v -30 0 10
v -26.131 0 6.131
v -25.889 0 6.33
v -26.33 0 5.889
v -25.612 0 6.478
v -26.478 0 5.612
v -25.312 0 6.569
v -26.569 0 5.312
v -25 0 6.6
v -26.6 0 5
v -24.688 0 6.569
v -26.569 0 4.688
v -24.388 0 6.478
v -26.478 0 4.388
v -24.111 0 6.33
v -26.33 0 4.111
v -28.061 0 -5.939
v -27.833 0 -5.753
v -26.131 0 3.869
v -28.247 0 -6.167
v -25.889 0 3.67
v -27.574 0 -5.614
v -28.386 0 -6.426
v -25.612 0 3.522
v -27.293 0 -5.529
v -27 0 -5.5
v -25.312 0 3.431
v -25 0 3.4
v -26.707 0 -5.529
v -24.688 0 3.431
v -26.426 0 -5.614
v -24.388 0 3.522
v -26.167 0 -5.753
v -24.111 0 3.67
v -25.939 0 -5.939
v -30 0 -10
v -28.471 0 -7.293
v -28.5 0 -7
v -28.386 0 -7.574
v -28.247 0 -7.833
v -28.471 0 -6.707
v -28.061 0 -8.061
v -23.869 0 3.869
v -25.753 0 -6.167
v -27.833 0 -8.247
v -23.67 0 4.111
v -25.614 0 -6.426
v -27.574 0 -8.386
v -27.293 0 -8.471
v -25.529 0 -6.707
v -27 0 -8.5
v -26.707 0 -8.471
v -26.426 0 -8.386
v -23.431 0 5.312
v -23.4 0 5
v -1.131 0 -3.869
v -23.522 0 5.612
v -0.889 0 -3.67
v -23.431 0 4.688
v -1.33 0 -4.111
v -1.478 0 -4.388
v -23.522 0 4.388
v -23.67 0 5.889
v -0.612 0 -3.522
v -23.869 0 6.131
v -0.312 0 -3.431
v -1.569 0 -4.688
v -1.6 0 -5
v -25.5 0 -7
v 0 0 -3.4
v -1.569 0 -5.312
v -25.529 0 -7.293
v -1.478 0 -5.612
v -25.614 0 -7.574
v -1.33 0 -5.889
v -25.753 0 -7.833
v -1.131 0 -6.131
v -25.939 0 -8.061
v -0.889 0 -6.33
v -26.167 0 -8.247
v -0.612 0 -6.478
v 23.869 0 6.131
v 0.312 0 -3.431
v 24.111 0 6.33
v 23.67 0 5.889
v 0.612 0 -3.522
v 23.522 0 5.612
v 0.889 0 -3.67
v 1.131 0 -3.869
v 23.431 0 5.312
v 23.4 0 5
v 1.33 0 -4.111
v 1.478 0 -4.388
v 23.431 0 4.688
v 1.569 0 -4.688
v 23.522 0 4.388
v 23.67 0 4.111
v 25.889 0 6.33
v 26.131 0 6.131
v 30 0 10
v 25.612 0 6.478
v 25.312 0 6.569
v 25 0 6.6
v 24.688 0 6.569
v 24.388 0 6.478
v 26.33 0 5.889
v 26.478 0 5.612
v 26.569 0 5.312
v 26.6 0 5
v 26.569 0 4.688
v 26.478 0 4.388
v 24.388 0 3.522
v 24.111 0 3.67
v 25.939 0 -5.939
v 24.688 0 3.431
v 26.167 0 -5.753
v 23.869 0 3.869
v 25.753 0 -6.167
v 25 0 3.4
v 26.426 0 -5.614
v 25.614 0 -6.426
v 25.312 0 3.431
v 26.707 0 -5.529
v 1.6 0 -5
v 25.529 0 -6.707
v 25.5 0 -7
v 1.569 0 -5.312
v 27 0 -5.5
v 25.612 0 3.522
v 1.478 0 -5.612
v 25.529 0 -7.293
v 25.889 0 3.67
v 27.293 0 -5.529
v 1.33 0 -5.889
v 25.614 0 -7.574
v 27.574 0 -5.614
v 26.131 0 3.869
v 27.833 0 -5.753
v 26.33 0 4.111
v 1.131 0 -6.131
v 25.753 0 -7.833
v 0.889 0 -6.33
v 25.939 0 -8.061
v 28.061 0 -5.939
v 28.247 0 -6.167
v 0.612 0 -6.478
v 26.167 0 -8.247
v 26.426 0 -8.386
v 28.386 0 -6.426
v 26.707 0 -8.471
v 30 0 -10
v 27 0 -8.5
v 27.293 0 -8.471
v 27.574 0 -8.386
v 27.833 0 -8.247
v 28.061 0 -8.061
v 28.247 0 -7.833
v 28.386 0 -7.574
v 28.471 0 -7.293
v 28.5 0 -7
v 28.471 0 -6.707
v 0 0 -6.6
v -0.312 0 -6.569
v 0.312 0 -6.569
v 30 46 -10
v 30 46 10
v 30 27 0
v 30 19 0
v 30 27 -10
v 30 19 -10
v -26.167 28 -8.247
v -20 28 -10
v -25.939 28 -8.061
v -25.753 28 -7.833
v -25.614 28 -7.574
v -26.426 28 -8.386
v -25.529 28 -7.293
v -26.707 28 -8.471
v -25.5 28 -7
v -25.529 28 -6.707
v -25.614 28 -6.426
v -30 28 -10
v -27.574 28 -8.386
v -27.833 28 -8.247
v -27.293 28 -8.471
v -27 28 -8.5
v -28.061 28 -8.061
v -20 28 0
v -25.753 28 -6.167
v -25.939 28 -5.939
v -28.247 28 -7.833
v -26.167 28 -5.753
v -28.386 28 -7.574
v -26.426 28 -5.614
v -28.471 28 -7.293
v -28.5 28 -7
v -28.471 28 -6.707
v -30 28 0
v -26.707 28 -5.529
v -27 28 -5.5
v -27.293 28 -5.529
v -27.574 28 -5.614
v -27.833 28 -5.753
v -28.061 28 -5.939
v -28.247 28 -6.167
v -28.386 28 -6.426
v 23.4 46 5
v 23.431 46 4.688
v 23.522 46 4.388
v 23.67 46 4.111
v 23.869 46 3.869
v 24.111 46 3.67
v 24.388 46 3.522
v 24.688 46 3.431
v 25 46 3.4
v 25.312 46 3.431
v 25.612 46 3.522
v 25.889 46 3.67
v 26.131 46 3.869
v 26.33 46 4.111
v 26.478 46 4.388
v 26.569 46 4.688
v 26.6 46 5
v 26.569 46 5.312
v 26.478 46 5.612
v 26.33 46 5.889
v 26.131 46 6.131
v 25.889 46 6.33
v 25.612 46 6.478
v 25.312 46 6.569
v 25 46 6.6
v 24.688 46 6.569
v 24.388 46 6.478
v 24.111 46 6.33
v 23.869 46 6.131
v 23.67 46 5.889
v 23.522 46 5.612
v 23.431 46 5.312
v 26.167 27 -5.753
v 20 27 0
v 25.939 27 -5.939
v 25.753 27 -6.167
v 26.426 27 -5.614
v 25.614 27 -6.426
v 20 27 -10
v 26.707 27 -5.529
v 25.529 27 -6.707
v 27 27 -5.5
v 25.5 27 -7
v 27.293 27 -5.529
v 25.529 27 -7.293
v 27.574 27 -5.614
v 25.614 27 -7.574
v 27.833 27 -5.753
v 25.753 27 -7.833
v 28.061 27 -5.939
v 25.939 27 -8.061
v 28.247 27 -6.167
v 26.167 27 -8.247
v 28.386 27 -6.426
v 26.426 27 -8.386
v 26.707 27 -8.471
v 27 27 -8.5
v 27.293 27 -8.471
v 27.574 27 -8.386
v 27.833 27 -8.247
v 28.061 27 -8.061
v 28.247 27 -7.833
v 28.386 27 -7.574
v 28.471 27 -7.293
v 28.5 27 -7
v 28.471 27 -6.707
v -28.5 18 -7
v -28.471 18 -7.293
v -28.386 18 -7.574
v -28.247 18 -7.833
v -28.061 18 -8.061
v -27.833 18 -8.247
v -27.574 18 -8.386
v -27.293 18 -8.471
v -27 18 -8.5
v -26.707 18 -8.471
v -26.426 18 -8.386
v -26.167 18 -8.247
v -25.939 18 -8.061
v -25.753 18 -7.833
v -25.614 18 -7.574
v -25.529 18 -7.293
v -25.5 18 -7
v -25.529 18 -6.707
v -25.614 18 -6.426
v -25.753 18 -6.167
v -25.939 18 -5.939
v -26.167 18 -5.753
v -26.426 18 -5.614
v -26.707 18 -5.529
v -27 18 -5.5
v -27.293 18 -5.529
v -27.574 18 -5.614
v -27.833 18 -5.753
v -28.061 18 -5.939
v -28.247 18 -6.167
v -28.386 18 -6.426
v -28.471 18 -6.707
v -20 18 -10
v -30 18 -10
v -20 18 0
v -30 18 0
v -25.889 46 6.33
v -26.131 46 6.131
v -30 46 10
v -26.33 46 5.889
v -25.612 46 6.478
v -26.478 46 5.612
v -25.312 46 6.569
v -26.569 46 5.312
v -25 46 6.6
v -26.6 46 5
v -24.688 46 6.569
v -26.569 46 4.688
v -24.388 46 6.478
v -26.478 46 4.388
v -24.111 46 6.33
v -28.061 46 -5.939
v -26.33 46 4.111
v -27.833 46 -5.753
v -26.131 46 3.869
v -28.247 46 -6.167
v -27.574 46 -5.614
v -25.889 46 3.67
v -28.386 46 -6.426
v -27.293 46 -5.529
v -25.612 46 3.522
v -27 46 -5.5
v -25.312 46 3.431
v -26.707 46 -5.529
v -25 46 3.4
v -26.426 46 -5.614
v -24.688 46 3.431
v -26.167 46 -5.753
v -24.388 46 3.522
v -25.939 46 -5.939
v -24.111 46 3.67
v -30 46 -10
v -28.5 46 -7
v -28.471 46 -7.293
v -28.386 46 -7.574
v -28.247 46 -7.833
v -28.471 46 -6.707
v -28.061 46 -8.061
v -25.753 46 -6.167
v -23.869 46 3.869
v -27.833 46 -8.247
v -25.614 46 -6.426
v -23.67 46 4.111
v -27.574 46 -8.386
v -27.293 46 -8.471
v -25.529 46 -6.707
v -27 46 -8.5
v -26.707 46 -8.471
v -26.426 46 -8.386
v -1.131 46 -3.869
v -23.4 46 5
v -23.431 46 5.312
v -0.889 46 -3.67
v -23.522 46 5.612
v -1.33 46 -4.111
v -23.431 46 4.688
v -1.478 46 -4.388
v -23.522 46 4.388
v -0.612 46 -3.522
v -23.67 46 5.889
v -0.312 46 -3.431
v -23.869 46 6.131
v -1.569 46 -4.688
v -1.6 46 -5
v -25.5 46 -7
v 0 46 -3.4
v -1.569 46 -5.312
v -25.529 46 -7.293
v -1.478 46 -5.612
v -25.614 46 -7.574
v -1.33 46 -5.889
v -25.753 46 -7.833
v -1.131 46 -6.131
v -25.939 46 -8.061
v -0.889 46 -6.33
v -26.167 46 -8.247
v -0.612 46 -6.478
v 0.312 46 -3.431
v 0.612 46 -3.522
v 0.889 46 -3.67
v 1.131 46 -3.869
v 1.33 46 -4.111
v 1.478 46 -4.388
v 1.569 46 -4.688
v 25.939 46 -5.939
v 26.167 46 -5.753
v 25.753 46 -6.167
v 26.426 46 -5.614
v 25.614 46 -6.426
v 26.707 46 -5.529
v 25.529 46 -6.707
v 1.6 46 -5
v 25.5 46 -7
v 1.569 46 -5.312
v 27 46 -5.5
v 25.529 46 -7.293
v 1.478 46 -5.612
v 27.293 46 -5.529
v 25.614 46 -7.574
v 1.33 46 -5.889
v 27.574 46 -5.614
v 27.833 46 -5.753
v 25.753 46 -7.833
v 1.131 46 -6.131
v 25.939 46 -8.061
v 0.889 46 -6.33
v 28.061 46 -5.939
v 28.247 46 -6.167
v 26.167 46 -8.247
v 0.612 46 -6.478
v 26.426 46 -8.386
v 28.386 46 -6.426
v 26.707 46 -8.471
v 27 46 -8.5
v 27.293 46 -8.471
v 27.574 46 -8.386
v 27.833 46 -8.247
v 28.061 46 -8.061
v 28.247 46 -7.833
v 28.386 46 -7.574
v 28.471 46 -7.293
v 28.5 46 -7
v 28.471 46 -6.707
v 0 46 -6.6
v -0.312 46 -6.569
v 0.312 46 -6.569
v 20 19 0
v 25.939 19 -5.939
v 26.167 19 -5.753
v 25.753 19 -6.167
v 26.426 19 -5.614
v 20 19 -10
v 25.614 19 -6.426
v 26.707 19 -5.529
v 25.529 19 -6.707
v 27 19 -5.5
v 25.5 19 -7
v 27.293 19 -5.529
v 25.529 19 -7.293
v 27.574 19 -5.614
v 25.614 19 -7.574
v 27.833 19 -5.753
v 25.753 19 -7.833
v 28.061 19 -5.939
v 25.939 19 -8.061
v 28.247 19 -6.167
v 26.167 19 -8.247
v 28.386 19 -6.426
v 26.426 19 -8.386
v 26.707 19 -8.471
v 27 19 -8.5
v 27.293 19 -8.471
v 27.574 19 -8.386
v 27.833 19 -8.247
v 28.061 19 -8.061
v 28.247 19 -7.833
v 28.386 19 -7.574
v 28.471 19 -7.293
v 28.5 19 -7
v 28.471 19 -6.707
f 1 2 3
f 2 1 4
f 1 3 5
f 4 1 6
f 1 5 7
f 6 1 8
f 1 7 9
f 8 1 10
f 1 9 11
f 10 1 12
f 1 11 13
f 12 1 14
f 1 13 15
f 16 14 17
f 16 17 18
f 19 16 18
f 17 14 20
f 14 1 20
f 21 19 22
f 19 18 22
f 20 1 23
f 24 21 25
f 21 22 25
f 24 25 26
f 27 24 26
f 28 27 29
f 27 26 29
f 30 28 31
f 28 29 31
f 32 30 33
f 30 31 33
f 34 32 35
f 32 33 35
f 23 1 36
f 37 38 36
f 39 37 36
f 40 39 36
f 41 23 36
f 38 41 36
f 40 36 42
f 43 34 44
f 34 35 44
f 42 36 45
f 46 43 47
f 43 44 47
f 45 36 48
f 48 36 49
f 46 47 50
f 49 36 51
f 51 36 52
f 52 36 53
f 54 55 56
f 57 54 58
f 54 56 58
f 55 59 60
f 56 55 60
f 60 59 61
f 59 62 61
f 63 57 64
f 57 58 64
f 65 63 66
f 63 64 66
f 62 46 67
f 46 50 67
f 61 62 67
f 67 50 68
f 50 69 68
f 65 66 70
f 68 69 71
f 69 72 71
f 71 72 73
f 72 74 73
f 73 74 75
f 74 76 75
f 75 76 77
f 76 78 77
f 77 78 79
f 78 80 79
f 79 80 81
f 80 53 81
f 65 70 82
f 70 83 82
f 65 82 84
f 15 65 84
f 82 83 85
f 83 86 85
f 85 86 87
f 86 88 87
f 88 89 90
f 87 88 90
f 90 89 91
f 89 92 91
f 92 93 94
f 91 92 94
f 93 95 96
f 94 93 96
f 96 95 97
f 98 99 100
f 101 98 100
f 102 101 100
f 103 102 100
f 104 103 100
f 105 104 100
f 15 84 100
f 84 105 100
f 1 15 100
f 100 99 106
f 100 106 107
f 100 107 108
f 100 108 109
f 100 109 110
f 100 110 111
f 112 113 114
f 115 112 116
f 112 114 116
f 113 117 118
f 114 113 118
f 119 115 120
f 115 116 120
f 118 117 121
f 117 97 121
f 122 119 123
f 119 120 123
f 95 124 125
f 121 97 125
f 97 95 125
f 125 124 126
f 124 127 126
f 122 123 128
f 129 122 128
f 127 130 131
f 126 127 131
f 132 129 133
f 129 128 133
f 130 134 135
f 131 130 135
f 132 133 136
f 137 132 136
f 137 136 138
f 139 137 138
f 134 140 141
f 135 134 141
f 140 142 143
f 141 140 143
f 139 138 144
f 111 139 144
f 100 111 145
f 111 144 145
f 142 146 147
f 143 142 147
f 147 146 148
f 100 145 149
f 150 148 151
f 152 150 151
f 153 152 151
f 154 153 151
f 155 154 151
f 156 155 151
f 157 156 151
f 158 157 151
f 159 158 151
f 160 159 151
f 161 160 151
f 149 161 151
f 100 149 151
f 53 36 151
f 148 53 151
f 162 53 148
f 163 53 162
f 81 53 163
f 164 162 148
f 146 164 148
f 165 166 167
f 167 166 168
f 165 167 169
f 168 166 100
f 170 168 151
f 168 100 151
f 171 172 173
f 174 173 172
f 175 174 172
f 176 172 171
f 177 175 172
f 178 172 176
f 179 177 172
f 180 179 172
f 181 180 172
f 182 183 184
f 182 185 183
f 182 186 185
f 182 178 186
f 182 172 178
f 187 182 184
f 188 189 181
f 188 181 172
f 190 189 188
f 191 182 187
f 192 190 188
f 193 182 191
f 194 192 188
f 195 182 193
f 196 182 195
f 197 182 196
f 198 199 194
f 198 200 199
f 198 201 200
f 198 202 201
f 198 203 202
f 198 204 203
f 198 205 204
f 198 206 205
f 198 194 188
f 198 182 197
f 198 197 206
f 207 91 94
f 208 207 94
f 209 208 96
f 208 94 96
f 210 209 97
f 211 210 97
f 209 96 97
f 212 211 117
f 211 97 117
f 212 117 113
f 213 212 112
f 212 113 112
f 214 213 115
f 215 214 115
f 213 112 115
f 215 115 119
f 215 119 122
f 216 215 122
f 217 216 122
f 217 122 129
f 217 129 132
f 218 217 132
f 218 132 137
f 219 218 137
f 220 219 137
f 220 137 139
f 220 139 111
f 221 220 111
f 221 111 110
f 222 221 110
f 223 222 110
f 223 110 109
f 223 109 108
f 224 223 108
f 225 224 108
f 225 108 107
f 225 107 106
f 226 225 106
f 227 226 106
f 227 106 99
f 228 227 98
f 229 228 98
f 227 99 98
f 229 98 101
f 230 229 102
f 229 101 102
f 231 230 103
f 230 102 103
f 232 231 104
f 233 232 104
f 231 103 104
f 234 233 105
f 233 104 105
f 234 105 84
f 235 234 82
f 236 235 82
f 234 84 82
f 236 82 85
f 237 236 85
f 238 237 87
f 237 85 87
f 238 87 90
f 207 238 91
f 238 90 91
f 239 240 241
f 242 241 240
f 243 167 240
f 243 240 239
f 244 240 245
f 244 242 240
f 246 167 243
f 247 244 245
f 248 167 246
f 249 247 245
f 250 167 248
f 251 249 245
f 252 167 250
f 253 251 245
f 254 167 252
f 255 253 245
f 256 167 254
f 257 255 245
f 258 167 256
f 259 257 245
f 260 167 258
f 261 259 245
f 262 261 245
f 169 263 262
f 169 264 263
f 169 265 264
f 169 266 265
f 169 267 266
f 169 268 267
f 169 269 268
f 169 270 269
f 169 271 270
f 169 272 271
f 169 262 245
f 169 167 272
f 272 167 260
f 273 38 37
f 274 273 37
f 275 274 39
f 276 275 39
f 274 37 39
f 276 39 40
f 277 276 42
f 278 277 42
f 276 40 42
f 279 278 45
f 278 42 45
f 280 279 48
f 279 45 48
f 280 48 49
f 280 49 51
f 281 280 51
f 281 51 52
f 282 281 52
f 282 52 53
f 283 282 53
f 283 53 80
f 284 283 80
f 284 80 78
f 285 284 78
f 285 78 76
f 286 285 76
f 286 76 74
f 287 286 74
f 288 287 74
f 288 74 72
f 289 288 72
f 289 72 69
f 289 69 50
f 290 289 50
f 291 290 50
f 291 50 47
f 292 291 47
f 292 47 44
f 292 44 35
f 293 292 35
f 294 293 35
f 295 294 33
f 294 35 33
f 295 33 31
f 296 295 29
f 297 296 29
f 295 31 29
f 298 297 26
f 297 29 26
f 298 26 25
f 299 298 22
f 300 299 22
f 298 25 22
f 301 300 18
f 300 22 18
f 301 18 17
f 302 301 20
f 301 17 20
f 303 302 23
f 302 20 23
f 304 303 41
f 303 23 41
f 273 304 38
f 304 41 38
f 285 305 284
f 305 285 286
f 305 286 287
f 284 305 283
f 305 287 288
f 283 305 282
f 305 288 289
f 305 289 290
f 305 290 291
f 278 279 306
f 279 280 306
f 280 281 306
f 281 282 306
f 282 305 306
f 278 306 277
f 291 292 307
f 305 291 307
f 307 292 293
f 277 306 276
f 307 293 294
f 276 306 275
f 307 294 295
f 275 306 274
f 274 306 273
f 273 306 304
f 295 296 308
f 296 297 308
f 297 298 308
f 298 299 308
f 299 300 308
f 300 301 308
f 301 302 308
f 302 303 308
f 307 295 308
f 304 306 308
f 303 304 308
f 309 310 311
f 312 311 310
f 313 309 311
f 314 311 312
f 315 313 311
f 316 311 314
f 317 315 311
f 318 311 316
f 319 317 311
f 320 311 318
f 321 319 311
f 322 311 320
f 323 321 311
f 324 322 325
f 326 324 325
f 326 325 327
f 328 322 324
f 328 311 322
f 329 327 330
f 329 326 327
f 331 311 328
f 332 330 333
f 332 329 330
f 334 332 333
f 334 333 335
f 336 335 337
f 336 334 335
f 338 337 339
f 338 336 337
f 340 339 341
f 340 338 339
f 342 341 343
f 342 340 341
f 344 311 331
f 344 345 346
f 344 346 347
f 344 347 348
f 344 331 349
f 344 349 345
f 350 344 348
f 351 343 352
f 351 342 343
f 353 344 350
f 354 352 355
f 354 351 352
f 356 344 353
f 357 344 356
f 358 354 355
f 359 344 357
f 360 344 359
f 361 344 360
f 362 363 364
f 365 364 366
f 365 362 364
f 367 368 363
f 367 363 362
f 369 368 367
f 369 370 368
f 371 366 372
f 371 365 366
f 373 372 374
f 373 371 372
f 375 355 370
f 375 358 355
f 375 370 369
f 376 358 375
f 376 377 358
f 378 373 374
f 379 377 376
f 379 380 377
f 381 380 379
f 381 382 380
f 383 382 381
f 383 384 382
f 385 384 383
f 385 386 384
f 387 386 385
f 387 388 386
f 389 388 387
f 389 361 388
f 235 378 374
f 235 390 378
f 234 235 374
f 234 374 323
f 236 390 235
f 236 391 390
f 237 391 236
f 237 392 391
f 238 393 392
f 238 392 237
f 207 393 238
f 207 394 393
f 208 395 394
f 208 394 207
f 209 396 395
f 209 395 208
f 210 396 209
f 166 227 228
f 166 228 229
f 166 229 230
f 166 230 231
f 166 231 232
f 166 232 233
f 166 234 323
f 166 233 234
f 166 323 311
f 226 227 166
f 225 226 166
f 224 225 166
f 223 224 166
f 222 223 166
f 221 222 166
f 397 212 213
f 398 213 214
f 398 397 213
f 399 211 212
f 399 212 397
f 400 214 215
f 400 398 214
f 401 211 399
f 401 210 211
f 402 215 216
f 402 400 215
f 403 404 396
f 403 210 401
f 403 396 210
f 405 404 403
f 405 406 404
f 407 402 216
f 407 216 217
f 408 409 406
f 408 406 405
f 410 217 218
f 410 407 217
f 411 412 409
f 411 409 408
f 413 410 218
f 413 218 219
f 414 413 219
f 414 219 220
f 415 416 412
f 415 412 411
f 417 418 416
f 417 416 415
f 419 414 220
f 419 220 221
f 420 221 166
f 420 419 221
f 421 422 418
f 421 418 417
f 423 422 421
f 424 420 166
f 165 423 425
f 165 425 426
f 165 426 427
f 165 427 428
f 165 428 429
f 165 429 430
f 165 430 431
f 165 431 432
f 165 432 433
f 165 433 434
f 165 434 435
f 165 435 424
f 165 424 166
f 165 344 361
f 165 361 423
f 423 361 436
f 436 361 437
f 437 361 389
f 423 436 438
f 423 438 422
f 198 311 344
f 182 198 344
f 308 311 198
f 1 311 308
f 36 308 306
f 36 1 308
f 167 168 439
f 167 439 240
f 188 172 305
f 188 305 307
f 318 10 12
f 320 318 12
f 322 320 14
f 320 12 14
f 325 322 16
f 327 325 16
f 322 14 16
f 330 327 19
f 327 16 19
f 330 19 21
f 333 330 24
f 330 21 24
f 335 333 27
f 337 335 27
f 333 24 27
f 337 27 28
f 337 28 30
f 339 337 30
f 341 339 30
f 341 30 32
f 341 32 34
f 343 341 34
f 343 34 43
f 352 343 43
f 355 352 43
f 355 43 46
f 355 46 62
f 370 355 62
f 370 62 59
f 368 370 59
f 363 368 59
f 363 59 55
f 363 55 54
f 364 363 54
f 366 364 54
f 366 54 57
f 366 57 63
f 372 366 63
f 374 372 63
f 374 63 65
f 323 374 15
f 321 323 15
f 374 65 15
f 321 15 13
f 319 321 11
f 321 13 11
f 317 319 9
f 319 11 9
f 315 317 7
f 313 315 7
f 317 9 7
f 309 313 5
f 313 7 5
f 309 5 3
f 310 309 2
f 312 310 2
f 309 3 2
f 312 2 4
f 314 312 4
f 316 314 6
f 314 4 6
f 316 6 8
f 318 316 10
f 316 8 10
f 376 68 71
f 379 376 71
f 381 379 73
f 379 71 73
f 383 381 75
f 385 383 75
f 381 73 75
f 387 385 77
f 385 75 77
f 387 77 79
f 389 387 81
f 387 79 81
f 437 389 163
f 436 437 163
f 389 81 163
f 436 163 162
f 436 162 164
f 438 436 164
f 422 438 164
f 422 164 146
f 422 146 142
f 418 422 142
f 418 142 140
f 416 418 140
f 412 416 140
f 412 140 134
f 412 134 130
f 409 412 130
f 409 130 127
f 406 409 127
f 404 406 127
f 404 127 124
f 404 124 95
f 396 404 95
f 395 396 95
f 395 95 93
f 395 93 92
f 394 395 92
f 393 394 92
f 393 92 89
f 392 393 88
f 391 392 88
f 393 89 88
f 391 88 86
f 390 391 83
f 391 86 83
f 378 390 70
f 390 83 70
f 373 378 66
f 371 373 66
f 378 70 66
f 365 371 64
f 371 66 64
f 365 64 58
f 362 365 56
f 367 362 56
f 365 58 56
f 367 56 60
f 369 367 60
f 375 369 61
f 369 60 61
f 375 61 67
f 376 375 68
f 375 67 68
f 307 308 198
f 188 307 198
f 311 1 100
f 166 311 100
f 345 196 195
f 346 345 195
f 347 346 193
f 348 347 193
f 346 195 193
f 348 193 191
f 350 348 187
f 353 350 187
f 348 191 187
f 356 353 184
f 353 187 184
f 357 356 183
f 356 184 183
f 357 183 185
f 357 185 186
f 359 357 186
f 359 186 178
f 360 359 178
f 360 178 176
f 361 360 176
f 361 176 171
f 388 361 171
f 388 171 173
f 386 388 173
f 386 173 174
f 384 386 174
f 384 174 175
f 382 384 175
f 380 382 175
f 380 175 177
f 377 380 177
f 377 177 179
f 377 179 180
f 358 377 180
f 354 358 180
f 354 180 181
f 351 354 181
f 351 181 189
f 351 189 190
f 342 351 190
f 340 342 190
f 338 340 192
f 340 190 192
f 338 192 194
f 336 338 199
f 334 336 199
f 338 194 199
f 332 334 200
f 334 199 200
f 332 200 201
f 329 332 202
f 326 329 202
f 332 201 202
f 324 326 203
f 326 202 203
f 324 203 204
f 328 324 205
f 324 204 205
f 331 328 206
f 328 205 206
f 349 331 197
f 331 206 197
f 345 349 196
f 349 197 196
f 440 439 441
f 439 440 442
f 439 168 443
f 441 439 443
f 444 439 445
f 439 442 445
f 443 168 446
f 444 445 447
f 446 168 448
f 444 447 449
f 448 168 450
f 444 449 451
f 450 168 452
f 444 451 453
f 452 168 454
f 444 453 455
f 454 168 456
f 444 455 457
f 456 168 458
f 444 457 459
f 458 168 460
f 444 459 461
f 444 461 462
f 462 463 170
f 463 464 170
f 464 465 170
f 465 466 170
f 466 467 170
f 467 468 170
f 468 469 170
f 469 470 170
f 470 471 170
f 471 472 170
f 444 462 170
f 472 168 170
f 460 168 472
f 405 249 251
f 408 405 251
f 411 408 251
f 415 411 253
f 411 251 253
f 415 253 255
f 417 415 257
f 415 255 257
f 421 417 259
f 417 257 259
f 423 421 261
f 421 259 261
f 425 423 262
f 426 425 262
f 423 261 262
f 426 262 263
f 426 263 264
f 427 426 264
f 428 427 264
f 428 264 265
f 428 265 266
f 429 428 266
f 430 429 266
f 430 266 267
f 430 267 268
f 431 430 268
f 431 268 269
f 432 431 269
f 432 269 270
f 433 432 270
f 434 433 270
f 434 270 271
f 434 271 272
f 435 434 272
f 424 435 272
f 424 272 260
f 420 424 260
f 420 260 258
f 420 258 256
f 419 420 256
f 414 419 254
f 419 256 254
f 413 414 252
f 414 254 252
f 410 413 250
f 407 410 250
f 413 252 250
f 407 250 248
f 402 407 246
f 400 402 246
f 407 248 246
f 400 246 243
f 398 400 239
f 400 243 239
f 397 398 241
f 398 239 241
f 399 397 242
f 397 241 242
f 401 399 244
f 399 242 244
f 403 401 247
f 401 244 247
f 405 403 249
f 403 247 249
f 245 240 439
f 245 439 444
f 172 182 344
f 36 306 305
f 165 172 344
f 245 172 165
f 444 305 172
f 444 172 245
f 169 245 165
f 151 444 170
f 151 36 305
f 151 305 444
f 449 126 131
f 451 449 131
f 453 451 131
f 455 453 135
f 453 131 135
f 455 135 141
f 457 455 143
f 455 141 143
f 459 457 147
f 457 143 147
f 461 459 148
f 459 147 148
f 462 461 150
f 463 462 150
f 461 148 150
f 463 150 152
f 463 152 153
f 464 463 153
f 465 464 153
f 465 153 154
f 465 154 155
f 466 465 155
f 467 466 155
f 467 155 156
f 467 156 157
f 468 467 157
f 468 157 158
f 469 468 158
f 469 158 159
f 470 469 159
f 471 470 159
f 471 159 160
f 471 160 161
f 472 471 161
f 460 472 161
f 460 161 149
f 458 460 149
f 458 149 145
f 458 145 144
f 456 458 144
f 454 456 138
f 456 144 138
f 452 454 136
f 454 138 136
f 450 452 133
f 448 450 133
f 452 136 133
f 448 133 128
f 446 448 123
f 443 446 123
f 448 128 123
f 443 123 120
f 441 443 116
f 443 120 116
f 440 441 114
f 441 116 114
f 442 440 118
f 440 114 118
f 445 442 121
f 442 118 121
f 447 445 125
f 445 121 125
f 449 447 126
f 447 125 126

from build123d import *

# Parameters (mm, degrees)
SKETCH1_W             = 60
SKETCH1_H             = 20
BOSS_EXTRUDE1_DEPTH   = 46
SKETCH2_W             = 10
SKETCH2_H             = 8
CUT_EXTRUDE1_DEPTH    = 10
F_3_0MM_DOWEL_HOLE1_D = 3
SKETCH5_W             = 10
SKETCH5_H             = 10
CUT_EXTRUDE2_DEPTH    = 10
M3_CLEARANCE_HOLE1_D  = 3.2


with BuildPart() as part:
    # Sketch1 → Boss-Extrude1 (new body)
    with BuildSketch(Plane(origin=(0, 0, 0), x_dir=(1, 0, 0), z_dir=(0, 1, 0))):
        Rectangle(SKETCH1_W, SKETCH1_H)
    extrude(amount=BOSS_EXTRUDE1_DEPTH)

    # Sketch2 → Cut-Extrude1 (cut)
    with BuildSketch(Plane(origin=(30, 0, 0), x_dir=(0, 0, -1), z_dir=(1, 0, 0))):
        with Locations((5, 23)):
            Rectangle(SKETCH2_W, SKETCH2_H)
    extrude(amount=-CUT_EXTRUDE1_DEPTH, mode=Mode.SUBTRACT)

    # Ø3.0mm Dowel Hole1 (through all)
    with Locations(Plane(origin=(0, 46, 0), x_dir=(1, 0, 0), z_dir=(0, 1, 0))):
        with Locations((-27, 7), (27, 7)):
            Hole(F_3_0MM_DOWEL_HOLE1_D / 2)

    # Sketch5 → Cut-Extrude2 (cut)
    with BuildSketch(Plane.ZY.offset(30)):
        with Locations((-5, 23)):
            Rectangle(SKETCH5_W, SKETCH5_H)
    extrude(amount=-CUT_EXTRUDE2_DEPTH, mode=Mode.SUBTRACT)

    # M3 Clearance Hole1 (through all)
    with Locations(Plane(origin=(0, 46, 0), x_dir=(1, 0, 0), z_dir=(0, 1, 0))):
        with Locations((-25, -5), (0, 5), (25, -5)):
            Hole(M3_CLEARANCE_HOLE1_D / 2)


solid = part.part
